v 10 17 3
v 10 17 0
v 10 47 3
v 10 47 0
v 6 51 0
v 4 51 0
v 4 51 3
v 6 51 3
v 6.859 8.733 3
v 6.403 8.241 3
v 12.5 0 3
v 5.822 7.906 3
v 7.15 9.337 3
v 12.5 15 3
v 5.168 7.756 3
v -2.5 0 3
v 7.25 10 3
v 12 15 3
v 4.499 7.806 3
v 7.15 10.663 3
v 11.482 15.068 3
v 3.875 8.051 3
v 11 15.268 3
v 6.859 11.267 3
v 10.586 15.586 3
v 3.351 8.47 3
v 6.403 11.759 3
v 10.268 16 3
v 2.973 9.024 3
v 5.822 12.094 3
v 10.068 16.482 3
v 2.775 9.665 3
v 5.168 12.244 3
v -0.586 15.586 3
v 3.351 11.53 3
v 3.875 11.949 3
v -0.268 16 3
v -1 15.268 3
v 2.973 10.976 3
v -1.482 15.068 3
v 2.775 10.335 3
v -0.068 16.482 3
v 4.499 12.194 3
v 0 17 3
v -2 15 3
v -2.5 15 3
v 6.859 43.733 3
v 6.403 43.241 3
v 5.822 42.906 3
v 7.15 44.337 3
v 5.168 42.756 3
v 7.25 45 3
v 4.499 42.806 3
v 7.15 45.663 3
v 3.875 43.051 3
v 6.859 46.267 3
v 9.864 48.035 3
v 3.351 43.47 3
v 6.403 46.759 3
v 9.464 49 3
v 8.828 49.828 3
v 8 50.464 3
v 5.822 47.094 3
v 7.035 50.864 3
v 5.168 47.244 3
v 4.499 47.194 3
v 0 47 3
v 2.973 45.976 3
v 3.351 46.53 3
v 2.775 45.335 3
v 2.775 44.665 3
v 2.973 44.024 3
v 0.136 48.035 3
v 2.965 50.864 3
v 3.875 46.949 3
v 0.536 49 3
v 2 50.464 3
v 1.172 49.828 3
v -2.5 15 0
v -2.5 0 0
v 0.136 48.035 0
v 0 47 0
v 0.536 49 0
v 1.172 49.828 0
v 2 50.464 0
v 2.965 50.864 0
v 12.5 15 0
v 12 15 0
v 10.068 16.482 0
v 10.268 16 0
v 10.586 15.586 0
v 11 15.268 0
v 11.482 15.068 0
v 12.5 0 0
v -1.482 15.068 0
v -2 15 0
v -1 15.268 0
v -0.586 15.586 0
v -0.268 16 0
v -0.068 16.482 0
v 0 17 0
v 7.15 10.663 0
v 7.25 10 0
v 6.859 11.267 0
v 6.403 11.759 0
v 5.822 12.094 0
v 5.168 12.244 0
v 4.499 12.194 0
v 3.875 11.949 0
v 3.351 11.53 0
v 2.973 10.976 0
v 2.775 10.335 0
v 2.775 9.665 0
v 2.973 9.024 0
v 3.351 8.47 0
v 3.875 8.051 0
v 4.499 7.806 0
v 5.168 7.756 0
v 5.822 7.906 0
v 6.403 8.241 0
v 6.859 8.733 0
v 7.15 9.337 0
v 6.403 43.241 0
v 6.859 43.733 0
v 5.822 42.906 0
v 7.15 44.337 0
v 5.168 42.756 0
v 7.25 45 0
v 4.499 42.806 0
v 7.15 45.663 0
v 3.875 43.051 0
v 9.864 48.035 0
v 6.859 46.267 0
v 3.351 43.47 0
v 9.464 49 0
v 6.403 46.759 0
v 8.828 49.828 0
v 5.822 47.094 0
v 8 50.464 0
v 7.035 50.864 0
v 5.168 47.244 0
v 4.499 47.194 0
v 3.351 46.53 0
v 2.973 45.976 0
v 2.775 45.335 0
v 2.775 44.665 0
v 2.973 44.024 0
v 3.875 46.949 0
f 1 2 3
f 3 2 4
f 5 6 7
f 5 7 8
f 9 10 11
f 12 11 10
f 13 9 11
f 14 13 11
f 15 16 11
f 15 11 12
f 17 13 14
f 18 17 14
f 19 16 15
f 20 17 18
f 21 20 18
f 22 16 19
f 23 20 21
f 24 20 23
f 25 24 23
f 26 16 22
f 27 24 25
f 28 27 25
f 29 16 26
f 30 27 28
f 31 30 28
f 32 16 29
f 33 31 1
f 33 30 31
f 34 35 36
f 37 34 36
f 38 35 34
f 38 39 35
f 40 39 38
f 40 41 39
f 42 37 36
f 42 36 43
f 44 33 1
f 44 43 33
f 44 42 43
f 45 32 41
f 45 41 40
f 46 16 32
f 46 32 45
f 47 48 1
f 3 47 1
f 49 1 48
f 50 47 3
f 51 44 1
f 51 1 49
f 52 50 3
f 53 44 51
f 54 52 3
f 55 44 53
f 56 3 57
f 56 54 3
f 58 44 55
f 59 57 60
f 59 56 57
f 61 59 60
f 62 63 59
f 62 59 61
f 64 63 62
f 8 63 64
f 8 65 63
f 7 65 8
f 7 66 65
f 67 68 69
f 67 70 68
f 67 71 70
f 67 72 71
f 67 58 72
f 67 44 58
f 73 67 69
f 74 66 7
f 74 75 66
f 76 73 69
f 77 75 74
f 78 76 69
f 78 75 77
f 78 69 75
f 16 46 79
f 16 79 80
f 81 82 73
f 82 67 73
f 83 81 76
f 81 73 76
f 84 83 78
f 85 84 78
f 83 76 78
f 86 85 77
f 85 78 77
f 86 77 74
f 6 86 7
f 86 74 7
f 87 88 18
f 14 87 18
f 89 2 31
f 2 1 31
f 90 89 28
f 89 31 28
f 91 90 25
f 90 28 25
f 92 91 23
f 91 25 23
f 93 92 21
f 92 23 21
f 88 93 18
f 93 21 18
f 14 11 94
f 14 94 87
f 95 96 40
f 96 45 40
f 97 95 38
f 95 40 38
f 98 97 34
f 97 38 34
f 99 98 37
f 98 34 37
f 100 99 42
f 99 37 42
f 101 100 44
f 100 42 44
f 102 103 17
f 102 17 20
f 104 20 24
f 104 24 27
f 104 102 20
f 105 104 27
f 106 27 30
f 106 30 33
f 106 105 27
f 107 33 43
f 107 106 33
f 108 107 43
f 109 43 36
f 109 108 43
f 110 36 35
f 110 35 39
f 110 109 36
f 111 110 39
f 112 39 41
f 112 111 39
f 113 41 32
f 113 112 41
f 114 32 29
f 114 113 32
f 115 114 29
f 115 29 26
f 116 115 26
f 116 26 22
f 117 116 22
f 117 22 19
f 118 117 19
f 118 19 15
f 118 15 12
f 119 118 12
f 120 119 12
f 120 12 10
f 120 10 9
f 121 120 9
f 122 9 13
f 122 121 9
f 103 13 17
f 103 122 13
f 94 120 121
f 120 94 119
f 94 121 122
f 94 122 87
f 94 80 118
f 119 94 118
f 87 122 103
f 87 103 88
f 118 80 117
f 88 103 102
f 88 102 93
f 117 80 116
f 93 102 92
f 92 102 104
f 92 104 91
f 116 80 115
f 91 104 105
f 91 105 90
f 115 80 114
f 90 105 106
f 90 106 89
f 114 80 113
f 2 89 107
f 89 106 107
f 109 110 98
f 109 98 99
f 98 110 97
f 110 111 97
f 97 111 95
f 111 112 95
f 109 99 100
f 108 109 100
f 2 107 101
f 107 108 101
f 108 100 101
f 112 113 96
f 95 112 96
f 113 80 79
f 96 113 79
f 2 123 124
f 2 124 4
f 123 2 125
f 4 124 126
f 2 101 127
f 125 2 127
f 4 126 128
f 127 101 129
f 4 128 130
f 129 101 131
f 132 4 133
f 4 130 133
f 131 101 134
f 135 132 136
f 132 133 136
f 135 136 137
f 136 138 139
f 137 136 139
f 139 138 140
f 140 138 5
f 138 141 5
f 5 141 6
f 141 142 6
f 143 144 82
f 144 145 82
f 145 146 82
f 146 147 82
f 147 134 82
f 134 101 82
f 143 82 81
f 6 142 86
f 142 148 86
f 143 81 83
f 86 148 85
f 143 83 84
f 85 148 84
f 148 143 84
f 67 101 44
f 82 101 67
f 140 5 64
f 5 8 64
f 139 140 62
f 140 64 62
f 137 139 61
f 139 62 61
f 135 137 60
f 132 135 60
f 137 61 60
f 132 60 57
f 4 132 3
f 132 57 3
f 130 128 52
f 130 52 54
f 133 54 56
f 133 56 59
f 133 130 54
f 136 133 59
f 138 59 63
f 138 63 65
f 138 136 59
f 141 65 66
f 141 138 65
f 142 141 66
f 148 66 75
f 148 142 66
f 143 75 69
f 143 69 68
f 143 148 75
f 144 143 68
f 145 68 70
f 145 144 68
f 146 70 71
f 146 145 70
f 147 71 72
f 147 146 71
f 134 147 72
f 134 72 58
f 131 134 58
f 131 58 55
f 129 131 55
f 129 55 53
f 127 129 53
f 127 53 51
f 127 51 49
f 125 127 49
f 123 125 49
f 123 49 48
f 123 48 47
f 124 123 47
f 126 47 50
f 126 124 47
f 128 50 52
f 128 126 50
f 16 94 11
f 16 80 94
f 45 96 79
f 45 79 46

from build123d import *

# Parameters (mm, degrees)
SKETCH_W     = 10
SKETCH_H     = 51
SKETCH_R     = 2.25
PAD_DEPTH    = 3
FILLET_R     = 4
SKETCH001_W  = 15
SKETCH001_H  = 3
PAD001_DEPTH = 2.5
SKETCH002_W  = 15
SKETCH002_H  = 3
PAD002_DEPTH = 2.5
FILLET001_R  = 2


with BuildPart() as part:
    # Sketch → Pad (new body)
    with BuildSketch(Plane.XY):
        with Locations((5, 25.5)):
            Rectangle(SKETCH_W, SKETCH_H)
        with Locations((5, 45)):
            Circle(SKETCH_R, mode=Mode.SUBTRACT)
        with Locations((5, 10)):
            Circle(SKETCH_R, mode=Mode.SUBTRACT)
    extrude(amount=PAD_DEPTH)

    # Fillet
    fillet_edges = [part.edges().sort_by_distance(p)[0] for p in [
        (0, 51, 1.5),
        (10, 51, 1.5),
    ]]
    fillet(fillet_edges, radius=FILLET_R)

    # Sketch001 (on Face7 of Fillet) → Pad001 (join)
    with BuildSketch(Plane(origin=(0, 0, 0), x_dir=(0, -1, 0), z_dir=(-1, 0, 0))):
        with Locations((-7.5, 1.5)):
            Rectangle(SKETCH001_W, SKETCH001_H)
    extrude(amount=PAD001_DEPTH)

    # Sketch002 (on Face1 of Pad001) → Pad002 (join)
    with BuildSketch(Plane.YZ.offset(10)):
        with Locations((7.5, 1.5)):
            Rectangle(SKETCH002_W, SKETCH002_H)
    extrude(amount=PAD002_DEPTH)

    # Fillet001
    fillet001_edges = [part.edges().sort_by_distance(p)[0] for p in [
        (0, 15, 1.5),
        (10, 15, 1.5),
    ]]
    fillet(fillet001_edges, radius=FILLET001_R)


solid = part.part
